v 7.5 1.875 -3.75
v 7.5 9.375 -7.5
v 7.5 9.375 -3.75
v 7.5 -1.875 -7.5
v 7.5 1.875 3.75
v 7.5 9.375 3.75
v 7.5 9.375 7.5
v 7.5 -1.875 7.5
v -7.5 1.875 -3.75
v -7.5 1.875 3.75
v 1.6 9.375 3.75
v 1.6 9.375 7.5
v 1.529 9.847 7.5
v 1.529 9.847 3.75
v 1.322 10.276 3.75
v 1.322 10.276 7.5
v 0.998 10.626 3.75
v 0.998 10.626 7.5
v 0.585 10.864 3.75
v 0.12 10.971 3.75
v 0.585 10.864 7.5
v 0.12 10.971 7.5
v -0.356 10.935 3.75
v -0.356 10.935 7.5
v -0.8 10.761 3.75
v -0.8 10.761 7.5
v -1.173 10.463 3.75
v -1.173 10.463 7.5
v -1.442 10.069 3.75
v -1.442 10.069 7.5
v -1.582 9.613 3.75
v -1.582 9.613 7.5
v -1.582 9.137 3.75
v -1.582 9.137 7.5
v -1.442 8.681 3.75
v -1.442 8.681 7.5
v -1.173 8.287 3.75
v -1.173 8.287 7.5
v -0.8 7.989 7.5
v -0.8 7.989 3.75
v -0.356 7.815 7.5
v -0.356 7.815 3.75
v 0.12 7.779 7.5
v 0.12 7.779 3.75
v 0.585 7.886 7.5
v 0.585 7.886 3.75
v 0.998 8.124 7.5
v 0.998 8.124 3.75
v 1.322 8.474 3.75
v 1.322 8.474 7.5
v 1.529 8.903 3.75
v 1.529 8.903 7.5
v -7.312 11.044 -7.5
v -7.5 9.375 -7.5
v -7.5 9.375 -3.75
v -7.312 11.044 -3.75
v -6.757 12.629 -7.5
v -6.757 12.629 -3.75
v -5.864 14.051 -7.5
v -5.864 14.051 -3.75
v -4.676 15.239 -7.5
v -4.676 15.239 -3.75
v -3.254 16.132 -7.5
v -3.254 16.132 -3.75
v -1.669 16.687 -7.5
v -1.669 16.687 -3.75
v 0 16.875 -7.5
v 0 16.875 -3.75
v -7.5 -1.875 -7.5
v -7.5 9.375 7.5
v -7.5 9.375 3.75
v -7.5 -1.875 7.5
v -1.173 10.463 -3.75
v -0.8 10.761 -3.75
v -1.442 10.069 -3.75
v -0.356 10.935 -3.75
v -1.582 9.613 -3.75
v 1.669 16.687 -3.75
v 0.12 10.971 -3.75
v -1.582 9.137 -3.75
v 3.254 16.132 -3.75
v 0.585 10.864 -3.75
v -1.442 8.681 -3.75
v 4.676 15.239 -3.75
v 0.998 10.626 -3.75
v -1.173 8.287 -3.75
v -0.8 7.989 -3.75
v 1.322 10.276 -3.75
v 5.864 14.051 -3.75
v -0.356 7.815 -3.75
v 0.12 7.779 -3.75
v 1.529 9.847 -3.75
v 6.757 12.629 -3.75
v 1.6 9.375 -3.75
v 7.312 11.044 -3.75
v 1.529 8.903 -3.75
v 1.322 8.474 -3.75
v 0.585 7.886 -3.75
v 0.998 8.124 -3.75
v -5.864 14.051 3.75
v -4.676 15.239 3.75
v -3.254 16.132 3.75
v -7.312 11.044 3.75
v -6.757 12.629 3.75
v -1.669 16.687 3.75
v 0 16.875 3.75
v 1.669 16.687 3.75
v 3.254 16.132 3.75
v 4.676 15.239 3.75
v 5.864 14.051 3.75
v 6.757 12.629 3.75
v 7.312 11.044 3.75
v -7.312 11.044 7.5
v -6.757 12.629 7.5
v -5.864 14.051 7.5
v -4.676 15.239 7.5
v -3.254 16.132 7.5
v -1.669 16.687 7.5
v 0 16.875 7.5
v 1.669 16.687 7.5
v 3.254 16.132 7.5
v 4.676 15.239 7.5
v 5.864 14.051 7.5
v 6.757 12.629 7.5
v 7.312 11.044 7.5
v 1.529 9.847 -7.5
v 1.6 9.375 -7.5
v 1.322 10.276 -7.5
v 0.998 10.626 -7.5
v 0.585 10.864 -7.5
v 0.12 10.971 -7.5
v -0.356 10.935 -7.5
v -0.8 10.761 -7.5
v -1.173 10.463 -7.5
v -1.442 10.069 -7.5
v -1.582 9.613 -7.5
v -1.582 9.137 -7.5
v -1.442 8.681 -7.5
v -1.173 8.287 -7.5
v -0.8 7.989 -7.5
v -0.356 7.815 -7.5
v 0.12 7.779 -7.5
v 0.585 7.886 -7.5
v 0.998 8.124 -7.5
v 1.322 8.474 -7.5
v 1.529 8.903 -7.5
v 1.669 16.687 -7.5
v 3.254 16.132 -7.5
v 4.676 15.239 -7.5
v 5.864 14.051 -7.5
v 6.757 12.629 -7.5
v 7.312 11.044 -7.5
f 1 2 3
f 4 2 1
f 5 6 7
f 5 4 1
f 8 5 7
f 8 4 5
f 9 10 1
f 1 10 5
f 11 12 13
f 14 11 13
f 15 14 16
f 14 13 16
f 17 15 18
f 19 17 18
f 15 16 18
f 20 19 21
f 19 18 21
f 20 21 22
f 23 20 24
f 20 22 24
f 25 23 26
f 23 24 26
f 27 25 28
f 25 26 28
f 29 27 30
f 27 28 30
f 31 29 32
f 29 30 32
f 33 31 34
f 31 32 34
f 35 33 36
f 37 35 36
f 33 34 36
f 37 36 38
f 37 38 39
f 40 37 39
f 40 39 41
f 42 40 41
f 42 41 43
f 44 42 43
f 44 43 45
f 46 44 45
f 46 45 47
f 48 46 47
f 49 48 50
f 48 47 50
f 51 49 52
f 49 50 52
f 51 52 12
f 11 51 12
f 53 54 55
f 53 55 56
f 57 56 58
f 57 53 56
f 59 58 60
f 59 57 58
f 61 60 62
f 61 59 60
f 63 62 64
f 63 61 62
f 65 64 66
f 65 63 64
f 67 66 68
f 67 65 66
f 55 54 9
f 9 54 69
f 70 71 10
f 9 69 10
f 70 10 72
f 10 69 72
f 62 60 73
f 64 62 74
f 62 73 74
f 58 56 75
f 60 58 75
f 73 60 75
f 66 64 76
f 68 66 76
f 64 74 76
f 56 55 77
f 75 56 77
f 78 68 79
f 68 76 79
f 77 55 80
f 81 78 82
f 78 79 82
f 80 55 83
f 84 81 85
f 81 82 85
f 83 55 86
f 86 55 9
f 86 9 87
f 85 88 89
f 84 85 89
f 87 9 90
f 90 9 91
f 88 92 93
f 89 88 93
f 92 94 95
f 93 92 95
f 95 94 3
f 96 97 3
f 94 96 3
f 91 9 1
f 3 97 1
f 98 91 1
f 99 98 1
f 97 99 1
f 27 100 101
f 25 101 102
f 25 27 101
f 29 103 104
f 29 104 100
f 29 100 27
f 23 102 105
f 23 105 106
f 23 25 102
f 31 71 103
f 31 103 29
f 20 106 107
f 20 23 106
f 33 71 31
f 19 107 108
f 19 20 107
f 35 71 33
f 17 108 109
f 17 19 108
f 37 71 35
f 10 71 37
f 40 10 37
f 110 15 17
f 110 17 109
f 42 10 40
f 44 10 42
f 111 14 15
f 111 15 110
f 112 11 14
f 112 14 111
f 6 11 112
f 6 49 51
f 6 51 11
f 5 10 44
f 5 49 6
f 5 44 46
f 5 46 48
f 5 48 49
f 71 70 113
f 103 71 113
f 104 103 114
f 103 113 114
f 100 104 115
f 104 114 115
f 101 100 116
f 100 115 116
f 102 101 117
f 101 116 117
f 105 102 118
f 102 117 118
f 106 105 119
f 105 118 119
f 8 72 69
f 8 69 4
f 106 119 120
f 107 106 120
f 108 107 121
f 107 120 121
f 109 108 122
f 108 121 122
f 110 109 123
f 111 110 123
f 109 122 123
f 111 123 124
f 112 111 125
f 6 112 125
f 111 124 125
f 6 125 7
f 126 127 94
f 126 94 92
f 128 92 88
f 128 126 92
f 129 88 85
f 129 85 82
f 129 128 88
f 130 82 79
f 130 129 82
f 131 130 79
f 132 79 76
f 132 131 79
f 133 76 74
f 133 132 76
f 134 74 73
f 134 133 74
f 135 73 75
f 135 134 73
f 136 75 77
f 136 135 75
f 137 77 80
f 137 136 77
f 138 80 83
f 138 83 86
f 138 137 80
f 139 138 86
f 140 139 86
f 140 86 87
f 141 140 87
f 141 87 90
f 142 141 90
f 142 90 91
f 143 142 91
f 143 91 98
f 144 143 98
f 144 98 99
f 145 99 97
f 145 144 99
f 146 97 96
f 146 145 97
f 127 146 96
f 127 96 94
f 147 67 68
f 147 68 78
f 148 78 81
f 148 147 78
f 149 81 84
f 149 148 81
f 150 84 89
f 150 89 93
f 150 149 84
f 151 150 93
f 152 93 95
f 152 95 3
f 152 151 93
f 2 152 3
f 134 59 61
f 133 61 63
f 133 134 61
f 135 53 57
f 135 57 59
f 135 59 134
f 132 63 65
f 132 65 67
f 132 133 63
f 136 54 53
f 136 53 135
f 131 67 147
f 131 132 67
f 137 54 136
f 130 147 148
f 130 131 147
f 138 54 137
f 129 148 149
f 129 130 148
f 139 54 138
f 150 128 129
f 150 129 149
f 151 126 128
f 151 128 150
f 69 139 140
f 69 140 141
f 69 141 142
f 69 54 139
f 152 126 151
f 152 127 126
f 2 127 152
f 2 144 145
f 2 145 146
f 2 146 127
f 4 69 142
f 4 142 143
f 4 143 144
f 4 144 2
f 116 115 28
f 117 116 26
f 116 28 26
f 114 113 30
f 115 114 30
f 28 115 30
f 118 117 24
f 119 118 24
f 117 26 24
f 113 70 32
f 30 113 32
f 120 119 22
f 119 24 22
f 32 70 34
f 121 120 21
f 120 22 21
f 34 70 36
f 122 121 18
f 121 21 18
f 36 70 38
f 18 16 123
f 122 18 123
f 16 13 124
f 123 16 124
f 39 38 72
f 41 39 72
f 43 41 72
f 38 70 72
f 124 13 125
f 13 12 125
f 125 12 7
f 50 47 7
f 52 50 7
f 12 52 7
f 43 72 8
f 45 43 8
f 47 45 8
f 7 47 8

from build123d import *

# Parameters (mm, degrees)
SKETCH1_W               = 15
SKETCH1_H               = 3.75
BOSS_EXTRUDE1_DEPTH     = 7.5
SKETCH2_W               = 15
SKETCH2_H               = 3.75
BOSS_EXTRUDE2_DEPTH     = 15
SKETCH3_R               = 1.6
CUT_EXTRUDE1_DEPTH      = 20.931523399
CUT_EXTRUDE1_DEPTH_BACK = 3.75


with BuildPart() as part:
    # Sketch1 → Boss-Extrude1 (new body)
    with BuildSketch(Plane.XY):
        Rectangle(SKETCH1_W, SKETCH1_H)
    extrude(amount=BOSS_EXTRUDE1_DEPTH)

    # Sketch2 → Boss-Extrude2 (add)
    with BuildSketch(Plane(origin=(0, 1.875, 0), x_dir=(1, 0, 0), z_dir=(0, 1, 0))):
        with Locations((0, -5.625)):
            Rectangle(SKETCH2_W, SKETCH2_H)
    extrude(amount=BOSS_EXTRUDE2_DEPTH)

    # Sketch3 → Cut-Extrude1 (cut, two sides)
    with BuildSketch(Plane.XY.offset(7.5)) as cut_extrude1_sk:
        with Locations((0, 9.375)):
            Circle(SKETCH3_R)
        with BuildLine():
            ThreePointArc((-3e-08, 16.875), (5.303300848, 14.67830087), (7.5, 9.375))
            Line((7.5, 9.375), (7.5, 16.875))
            Line((7.5, 16.875), (-3e-08, 16.875))
        make_face()
        with BuildLine():
            ThreePointArc((-7.5, 9.375), (-5.30330087, 14.678300848), (-3e-08, 16.875))
            Line((-3e-08, 16.875), (-7.5, 16.875))
            Line((-7.5, 16.875), (-7.5, 9.375))
        make_face()
    extrude(amount=CUT_EXTRUDE1_DEPTH, mode=Mode.SUBTRACT)
    extrude(cut_extrude1_sk.sketch, amount=-CUT_EXTRUDE1_DEPTH_BACK, mode=Mode.SUBTRACT)

    # Mirror1: part across plane


with BuildPart() as part_1:
    add(part.part)
    add(part.part.mirror(Plane(origin=(0, 0, 0), x_dir=(1, 0, 0), z_dir=(0, 0, -1))))


solid = part_1.part
